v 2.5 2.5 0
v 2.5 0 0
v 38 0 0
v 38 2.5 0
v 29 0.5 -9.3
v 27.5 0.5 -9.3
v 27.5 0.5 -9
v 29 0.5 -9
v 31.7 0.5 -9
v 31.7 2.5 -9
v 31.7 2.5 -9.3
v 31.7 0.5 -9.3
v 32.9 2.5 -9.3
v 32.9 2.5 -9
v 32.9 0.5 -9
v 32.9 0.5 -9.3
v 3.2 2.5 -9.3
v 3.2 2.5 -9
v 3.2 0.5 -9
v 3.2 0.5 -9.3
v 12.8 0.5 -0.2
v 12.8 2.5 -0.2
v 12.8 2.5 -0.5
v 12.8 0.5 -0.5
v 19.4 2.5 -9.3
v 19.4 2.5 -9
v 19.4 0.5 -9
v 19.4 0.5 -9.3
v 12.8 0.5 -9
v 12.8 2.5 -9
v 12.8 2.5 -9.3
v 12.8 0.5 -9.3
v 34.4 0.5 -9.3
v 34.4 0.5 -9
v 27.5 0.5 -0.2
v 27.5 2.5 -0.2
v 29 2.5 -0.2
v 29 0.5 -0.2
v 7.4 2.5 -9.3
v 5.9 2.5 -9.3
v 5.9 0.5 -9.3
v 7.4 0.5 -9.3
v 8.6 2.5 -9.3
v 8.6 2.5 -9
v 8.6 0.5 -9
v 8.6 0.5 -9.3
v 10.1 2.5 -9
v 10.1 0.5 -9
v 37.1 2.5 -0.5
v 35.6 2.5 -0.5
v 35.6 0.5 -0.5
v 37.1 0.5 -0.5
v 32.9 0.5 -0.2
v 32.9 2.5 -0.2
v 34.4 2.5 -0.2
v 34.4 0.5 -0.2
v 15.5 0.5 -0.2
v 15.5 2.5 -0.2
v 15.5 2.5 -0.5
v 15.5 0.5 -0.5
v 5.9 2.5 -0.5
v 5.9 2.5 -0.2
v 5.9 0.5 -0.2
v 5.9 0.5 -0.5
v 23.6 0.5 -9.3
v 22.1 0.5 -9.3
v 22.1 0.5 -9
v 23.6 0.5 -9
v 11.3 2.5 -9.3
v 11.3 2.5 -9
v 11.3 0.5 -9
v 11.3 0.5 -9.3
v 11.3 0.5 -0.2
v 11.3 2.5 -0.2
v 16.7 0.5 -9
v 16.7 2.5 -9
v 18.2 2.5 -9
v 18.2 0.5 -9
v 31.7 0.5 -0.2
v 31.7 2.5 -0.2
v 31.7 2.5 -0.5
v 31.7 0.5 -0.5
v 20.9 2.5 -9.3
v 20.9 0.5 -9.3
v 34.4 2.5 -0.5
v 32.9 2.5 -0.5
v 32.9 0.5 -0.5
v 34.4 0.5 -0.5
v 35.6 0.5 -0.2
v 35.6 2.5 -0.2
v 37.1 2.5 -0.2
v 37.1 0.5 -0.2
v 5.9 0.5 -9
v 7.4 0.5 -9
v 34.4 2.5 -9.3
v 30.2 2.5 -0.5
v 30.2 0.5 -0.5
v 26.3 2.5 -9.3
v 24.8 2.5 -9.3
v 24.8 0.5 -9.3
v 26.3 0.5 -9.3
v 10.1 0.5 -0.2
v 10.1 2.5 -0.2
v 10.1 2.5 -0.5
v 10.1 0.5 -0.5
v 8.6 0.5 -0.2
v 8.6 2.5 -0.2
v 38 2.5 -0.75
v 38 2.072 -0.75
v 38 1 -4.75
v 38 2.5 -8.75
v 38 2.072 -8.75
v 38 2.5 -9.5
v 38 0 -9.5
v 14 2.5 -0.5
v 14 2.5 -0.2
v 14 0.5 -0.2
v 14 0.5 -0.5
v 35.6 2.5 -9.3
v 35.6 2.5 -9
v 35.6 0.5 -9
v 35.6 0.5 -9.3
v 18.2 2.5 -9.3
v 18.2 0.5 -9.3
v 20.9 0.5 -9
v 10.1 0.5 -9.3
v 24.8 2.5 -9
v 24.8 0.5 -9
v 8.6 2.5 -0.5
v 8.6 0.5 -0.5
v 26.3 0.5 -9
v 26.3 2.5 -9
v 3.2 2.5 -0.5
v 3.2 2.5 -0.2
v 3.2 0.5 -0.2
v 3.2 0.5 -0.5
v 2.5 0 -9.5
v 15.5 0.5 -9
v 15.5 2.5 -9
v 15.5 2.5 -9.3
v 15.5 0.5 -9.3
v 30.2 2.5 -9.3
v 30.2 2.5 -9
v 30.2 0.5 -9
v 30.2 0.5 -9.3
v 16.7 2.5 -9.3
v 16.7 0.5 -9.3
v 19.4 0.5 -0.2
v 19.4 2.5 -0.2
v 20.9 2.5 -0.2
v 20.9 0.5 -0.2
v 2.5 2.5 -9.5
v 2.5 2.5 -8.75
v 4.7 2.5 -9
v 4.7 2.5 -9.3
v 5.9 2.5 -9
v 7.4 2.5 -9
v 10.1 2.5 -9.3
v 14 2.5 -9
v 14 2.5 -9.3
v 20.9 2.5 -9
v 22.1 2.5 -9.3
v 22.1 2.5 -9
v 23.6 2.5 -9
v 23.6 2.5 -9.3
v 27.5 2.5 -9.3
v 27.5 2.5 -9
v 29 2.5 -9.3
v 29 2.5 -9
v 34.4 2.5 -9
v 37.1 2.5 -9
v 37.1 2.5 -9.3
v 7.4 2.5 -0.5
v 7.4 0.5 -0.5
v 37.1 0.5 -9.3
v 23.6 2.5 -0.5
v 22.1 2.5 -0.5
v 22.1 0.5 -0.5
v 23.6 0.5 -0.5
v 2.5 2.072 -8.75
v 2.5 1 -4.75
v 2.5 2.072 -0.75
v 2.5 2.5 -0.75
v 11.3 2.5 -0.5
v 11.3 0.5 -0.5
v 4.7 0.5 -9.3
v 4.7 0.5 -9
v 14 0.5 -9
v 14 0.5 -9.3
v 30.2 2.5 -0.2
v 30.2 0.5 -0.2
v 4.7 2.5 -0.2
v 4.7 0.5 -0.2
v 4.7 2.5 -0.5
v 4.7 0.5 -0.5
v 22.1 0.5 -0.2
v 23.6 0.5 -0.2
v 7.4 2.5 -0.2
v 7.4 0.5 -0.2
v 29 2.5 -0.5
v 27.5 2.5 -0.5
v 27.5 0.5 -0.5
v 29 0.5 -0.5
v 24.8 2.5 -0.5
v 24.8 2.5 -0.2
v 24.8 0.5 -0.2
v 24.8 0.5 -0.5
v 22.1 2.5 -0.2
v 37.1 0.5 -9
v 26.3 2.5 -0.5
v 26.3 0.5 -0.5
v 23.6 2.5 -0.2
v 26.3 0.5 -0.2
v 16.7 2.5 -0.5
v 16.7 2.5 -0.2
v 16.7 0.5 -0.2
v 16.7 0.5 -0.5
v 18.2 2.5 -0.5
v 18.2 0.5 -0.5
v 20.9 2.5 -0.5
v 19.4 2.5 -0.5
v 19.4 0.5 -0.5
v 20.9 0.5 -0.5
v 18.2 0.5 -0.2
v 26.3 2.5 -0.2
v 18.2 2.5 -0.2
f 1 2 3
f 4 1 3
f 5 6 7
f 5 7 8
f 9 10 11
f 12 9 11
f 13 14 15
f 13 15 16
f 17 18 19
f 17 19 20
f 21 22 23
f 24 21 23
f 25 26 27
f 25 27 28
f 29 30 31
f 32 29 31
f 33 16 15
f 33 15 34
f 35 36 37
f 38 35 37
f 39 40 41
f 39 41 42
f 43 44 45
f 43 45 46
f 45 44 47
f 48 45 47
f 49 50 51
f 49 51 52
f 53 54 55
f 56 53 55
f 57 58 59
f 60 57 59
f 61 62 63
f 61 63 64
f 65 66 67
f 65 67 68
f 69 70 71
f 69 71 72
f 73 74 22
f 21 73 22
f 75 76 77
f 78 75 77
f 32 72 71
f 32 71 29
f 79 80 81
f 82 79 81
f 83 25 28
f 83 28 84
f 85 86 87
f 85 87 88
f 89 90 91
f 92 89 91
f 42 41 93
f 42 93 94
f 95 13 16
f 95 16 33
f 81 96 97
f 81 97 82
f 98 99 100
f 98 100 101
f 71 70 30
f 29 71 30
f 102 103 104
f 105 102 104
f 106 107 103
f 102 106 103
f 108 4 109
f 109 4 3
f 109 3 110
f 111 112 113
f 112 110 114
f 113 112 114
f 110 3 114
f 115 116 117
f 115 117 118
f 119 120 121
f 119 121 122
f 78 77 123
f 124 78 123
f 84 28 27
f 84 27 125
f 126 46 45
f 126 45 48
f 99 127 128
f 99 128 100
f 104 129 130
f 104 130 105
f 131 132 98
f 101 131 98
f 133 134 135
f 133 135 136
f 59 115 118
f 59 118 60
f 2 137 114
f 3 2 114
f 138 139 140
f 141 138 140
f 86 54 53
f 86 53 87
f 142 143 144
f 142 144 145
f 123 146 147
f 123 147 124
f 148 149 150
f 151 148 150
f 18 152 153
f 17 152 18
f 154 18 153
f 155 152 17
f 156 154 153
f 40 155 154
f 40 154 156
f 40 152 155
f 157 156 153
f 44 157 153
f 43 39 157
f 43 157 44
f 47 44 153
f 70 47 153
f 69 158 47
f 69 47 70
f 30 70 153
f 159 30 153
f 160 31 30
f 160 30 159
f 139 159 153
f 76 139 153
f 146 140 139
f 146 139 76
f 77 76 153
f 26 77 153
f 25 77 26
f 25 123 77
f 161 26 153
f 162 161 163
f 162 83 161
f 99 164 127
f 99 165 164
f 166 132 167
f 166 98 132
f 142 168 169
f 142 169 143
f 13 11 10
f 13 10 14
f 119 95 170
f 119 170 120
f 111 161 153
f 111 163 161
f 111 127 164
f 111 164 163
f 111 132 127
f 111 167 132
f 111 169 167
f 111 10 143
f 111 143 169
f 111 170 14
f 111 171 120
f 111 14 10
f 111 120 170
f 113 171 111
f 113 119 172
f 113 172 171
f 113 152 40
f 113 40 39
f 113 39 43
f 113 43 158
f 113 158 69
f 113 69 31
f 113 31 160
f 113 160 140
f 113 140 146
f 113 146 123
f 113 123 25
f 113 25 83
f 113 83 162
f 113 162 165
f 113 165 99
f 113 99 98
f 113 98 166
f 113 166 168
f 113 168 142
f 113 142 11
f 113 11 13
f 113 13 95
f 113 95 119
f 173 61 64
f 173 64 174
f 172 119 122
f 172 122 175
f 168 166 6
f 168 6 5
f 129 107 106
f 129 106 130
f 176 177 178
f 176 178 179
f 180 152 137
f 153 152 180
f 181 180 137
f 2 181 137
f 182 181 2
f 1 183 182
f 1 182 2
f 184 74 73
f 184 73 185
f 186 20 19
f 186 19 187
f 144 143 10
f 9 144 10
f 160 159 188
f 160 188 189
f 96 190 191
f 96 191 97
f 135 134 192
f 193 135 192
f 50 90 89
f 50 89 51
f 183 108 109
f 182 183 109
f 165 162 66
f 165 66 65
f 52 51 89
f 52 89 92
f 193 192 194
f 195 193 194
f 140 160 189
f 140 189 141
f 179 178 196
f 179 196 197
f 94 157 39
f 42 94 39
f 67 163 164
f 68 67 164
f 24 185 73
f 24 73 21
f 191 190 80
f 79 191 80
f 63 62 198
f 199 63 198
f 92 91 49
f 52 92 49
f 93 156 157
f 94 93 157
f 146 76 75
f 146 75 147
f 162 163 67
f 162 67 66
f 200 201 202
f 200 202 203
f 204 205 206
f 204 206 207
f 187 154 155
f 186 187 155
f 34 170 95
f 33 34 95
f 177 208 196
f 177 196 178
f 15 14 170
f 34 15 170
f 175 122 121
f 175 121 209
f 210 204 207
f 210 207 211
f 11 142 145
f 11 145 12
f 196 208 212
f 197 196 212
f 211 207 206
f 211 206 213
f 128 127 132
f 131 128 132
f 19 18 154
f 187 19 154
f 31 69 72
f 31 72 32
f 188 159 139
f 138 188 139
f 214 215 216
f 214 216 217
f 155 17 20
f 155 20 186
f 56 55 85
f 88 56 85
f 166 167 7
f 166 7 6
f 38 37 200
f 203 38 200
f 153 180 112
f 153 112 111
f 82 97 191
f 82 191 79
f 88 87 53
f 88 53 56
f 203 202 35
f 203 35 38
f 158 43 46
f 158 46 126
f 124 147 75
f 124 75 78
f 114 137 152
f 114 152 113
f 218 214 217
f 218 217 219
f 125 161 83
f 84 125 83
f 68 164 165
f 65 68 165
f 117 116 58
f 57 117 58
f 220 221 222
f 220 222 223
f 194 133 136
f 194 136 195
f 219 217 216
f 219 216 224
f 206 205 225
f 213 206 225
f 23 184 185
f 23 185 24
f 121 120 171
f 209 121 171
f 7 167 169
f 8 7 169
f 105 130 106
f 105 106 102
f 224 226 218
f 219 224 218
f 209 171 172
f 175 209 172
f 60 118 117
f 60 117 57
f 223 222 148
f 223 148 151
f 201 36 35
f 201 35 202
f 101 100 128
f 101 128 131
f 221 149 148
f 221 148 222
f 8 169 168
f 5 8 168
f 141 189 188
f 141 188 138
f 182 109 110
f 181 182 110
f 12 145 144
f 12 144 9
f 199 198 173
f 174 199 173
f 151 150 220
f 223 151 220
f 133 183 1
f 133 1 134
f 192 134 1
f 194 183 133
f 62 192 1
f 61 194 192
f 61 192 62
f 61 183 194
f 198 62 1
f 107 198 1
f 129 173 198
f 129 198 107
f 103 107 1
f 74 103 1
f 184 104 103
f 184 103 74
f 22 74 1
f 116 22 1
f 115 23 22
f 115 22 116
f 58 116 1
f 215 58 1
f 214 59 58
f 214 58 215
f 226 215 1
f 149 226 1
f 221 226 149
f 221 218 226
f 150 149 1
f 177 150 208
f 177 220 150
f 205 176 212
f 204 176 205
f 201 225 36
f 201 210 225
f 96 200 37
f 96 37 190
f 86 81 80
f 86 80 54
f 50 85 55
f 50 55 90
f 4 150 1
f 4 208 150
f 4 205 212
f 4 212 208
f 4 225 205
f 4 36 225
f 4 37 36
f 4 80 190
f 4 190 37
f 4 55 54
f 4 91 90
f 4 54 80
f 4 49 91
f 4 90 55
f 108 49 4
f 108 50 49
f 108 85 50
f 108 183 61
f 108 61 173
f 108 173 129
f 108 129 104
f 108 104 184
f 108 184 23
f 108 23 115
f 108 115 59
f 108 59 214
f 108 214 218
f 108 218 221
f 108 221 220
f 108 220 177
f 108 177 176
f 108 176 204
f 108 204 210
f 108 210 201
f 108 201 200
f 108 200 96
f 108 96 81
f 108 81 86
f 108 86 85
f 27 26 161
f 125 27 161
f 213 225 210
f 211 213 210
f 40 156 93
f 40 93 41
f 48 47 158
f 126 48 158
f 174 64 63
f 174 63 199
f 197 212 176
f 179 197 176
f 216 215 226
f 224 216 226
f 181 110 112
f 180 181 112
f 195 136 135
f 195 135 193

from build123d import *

# Parameters (mm, degrees)
SKETCH1_W               = 38
SKETCH1_H               = 9.5
BOSS_EXTRUDE1_DEPTH     = 2.5
SKETCH2_W               = 1.5
SKETCH2_H               = 0.3
CUT_EXTRUDE1_DEPTH      = 2
LPATTERN1_COUNT         = 14
LPATTERN1_PITCH         = 2.7
LPATTERN1_COUNT_DIR2    = 2
LPATTERN1_PITCH_DIR2    = 8.8
CUT_EXTRUDE2_DEPTH      = 1
CUT_EXTRUDE2_DEPTH_BACK = 39
CUT_EXTRUDE3_DEPTH      = 2.5


with BuildPart() as part:
    # Sketch1 → Boss-Extrude1 (new body)
    with BuildSketch(Plane(origin=(0, 0, 0), x_dir=(1, 0, 0), z_dir=(0, 1, 0))):
        with Locations((19, 4.75)):
            Rectangle(SKETCH1_W, SKETCH1_H)
    extrude(amount=BOSS_EXTRUDE1_DEPTH)

    # Sketch2 → Cut-Extrude1 (cut)
    with BuildSketch(Plane(origin=(0, 2.5, 0), x_dir=(1, 0, 0), z_dir=(0, 1, 0))):
        with Locations((1.25, 0.35)):
            Rectangle(SKETCH2_W, SKETCH2_H)
    cut_extrude1 = extrude(amount=-CUT_EXTRUDE1_DEPTH, mode=Mode.SUBTRACT)

    # LPattern1: Cut-Extrude1 14 × 2
    with Locations(*[(i * LPATTERN1_PITCH, 0, -j * LPATTERN1_PITCH_DIR2) for i in range(LPATTERN1_COUNT) for j in range(LPATTERN1_COUNT_DIR2) if (i, j) != (0, 0)]):
        add(cut_extrude1, mode=Mode.SUBTRACT)

    # Sketch4 → Cut-Extrude2 (cut, two sides)
    with BuildSketch(Plane(origin=(38, 0, 0), x_dir=(0, 0, -1), z_dir=(1, 0, 0))) as cut_extrude2_sk:
        Polygon((0.75, 30.700274723), (0.75, 2.5), (0.75, 2.07179677), (4.75, 1), (8.75, 2.07179677), (8.75, 2.5), (8.75, 30.700274723), (8.75, 87.10082417), (0.75, 87.10082417), align=None)
    extrude(amount=CUT_EXTRUDE2_DEPTH, mode=Mode.SUBTRACT)
    extrude(cut_extrude2_sk.sketch, amount=-CUT_EXTRUDE2_DEPTH_BACK, mode=Mode.SUBTRACT)

    # Sketch5 → Cut-Extrude3 (cut)
    with BuildSketch(Plane.ZY):
        Polygon((-0.75, 2.5), (-0.75, 2.07179677), (-4.75, 1), (-8.75, 2.07179677), (-8.75, 2.5), (-9.5, 2.5), (-9.5, 0), (0, 0), (0, 2.5), align=None)
    extrude(amount=-CUT_EXTRUDE3_DEPTH, mode=Mode.SUBTRACT)


solid = part.part
